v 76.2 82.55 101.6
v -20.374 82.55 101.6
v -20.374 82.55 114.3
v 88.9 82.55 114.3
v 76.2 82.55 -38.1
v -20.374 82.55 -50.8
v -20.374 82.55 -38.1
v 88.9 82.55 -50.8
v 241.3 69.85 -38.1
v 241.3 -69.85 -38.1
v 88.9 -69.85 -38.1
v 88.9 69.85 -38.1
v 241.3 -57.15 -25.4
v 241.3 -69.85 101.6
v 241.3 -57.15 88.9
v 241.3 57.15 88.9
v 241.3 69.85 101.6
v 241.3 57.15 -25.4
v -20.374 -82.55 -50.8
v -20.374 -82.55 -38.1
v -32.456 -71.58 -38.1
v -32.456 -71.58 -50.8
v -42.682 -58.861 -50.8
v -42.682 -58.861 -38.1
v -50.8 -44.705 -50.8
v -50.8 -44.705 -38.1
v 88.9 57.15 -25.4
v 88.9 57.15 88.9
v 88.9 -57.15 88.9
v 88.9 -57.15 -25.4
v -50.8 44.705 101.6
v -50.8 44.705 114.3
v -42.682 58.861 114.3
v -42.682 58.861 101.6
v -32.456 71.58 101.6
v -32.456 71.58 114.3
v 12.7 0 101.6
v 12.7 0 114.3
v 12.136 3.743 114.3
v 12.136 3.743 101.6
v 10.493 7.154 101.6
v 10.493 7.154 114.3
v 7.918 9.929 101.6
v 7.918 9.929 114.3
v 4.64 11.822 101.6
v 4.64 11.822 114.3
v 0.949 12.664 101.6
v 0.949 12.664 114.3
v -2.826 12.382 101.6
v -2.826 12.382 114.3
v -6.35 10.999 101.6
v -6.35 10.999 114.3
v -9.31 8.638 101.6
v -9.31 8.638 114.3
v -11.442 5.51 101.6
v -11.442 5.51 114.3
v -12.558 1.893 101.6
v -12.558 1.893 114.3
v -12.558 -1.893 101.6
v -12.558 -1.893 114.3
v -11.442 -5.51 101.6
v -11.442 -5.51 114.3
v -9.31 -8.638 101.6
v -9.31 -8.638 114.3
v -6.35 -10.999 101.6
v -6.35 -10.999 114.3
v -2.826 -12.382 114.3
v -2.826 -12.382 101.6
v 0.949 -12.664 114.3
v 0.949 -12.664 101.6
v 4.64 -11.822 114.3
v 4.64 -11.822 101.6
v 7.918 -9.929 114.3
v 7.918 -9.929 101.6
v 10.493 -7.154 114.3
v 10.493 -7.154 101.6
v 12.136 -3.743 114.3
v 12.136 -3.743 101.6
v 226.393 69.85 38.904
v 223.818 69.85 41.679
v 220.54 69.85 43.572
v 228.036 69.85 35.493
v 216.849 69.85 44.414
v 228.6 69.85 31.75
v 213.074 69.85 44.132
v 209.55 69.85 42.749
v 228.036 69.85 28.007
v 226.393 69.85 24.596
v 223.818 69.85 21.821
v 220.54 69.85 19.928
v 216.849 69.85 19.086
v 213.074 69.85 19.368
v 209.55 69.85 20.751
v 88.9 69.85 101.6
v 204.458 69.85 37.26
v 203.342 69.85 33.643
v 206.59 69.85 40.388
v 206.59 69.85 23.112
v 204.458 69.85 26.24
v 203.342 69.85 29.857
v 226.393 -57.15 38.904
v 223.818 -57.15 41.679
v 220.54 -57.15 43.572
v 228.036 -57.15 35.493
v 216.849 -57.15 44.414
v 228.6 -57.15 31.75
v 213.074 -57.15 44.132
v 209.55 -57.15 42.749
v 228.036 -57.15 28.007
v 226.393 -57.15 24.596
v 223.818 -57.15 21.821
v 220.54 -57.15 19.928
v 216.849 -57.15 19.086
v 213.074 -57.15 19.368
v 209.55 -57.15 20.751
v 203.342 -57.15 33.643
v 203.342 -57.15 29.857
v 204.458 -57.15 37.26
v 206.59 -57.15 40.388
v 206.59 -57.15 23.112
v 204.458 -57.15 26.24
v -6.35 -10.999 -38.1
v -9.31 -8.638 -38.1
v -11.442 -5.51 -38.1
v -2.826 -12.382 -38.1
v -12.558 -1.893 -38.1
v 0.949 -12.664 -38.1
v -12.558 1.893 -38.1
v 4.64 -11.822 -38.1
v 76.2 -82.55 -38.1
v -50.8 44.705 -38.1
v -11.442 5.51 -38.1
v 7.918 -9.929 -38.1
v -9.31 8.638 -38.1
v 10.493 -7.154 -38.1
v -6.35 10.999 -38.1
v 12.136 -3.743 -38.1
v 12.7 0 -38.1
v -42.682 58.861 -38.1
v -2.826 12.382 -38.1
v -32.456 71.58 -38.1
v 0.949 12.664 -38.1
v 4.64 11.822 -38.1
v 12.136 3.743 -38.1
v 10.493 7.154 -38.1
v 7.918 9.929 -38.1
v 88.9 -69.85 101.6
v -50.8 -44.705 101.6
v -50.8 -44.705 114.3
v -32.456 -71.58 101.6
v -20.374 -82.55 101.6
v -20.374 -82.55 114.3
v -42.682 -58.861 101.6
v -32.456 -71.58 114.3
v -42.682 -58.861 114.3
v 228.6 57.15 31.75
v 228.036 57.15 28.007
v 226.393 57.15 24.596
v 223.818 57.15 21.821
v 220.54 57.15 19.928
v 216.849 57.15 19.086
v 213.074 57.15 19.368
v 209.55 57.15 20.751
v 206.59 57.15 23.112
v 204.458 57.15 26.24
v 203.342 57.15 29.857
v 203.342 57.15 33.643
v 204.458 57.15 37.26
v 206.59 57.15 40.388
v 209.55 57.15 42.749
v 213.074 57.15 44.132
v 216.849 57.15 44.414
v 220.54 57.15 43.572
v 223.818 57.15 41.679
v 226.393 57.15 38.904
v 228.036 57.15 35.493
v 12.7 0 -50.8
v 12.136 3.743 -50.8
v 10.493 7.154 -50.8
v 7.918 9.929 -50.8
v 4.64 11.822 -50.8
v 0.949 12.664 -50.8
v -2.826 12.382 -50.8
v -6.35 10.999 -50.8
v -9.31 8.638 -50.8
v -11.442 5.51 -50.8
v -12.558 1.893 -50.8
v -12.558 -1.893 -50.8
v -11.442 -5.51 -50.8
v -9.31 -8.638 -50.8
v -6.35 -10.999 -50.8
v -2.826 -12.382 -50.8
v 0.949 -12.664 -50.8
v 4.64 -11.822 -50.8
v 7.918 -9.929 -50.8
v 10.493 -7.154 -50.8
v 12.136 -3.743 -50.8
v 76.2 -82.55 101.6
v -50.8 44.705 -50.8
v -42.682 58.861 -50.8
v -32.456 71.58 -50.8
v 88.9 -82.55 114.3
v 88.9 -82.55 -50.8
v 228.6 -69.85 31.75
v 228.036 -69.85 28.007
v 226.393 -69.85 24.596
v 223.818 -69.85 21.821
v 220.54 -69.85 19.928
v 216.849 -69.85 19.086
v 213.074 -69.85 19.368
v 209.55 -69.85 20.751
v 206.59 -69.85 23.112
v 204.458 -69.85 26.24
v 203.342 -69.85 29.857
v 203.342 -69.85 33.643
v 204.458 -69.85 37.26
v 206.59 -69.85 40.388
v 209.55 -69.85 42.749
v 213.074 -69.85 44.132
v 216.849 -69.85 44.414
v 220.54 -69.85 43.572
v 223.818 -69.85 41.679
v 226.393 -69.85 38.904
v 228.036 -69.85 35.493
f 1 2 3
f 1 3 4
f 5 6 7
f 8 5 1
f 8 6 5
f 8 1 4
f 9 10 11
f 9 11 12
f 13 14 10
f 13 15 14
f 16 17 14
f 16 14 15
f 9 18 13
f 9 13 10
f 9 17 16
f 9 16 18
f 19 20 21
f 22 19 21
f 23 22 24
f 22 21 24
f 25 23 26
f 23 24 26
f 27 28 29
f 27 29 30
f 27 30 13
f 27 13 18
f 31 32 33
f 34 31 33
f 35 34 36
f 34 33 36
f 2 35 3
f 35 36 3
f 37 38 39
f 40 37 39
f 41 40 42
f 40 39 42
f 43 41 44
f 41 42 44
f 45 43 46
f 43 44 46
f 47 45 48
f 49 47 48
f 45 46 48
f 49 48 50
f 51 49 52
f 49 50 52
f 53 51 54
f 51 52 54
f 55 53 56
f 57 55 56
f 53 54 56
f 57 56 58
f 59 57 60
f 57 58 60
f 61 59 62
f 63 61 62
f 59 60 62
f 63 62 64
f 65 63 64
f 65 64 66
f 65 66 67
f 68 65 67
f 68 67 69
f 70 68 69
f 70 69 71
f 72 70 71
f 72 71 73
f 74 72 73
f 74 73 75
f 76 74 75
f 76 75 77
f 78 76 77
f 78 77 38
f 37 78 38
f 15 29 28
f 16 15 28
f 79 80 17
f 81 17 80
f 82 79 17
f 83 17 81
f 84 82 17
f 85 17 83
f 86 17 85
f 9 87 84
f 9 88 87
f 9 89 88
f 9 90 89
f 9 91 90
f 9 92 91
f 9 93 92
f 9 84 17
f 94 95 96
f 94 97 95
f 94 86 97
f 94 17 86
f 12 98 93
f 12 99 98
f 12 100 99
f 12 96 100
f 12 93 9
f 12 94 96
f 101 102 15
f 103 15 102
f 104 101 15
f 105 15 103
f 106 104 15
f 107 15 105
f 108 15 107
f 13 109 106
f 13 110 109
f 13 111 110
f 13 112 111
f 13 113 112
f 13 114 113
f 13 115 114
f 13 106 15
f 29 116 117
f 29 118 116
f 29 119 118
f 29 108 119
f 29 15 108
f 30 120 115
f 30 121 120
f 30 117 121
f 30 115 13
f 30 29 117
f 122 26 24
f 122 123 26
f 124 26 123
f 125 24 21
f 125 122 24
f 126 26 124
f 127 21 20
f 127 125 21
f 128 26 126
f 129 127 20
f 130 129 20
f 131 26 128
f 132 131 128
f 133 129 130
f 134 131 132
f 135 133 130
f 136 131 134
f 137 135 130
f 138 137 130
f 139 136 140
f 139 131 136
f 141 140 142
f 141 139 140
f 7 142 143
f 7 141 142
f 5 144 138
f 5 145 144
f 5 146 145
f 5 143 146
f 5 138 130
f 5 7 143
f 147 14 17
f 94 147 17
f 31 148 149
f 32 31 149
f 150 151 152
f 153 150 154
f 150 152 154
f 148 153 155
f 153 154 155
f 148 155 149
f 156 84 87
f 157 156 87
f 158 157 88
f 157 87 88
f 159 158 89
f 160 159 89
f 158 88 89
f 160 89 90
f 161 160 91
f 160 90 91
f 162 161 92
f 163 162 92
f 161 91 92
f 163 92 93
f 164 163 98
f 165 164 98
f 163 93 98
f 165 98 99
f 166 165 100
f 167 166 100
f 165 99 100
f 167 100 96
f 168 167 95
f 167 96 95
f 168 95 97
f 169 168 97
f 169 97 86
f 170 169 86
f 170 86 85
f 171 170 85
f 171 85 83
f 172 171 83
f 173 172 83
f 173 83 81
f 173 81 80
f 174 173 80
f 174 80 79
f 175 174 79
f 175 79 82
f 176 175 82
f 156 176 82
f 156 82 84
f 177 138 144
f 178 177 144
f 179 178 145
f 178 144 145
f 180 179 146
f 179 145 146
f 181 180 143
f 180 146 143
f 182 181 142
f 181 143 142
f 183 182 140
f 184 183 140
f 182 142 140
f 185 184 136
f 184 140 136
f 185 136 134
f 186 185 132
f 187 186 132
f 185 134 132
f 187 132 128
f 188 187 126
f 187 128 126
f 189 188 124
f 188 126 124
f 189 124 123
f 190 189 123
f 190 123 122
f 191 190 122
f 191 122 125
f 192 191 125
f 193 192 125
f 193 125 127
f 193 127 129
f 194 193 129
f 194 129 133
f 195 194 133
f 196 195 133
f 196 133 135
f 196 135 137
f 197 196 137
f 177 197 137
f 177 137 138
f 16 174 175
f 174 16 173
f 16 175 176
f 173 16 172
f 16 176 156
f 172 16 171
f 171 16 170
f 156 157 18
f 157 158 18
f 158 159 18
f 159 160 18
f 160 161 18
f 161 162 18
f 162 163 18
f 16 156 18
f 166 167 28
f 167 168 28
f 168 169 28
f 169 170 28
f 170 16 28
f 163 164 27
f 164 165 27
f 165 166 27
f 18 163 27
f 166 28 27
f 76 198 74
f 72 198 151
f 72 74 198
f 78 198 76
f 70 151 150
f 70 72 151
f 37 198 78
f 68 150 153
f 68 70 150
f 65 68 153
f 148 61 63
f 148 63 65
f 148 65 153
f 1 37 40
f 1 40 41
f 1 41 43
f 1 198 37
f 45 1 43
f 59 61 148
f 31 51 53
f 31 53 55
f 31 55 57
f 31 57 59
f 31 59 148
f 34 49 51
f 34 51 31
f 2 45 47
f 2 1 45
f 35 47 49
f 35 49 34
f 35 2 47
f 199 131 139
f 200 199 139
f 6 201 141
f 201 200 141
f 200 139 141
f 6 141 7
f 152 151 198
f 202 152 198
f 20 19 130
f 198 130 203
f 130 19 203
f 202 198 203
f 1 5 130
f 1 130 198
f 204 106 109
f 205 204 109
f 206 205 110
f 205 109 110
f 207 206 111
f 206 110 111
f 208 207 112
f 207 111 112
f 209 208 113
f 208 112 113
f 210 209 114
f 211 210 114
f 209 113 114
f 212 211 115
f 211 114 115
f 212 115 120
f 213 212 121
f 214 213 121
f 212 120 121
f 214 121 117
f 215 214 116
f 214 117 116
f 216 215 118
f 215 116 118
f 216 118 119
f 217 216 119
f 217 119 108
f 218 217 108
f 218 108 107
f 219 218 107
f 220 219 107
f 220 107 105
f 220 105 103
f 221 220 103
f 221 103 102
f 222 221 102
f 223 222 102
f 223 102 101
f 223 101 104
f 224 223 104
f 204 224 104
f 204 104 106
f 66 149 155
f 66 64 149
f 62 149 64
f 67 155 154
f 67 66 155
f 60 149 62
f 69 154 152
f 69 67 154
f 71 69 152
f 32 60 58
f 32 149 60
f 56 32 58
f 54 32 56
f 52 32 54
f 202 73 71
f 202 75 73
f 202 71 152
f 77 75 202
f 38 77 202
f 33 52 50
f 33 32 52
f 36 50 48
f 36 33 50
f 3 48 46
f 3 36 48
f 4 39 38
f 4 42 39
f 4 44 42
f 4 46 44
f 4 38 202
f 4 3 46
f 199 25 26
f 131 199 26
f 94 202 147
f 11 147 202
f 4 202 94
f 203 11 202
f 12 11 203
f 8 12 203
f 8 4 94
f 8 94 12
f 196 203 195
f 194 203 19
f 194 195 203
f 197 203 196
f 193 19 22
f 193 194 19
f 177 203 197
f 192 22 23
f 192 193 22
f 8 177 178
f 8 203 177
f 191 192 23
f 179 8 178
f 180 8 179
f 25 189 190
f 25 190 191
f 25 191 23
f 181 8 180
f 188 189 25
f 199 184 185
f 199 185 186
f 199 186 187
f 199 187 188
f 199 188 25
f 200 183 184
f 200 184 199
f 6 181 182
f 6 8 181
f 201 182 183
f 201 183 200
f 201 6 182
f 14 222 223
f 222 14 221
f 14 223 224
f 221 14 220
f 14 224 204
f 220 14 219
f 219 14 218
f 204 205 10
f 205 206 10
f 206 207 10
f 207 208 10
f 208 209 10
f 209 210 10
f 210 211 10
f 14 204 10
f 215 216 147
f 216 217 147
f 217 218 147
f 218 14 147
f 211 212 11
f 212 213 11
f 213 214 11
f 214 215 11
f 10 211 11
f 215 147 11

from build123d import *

# Parameters (mm, degrees)
BOSS_EXTRUDE1_DEPTH     = 82.55
SKETCH4_W               = 139.7
SKETCH4_H               = 139.7
SKETCH4_W_2             = 114.3
SKETCH4_H_2             = 114.3
BOSS_EXTRUDE2_DEPTH     = 152.4
SKETCH5_R               = 12.7
CUT_EXTRUDE1_DEPTH      = 1
CUT_EXTRUDE1_DEPTH_BACK = 166.1
SKETCH6_R               = 12.7
CUT_EXTRUDE2_DEPTH      = 13.7
CUT_EXTRUDE2_DEPTH_BACK = 153.4
CUT_EXTRUDE4_DEPTH      = 1
CUT_EXTRUDE4_DEPTH_BACK = 166.1
BODY_MOVE_COPY1_ANGLE   = 90
BODY_MOVE_COPY2_ANGLE   = 90


with BuildPart() as part:
    # Sketch2 → Boss-Extrude1 (new body, symmetric)
    with BuildSketch(Plane(origin=(0, 0, 0), x_dir=(1, 0, 0), z_dir=(0, 1, 0))):
        Polygon((-50.8, 38.1), (76.2, 38.1), (76.2, -101.6), (-50.8, -101.6), (-50.8, -114.3), (88.9, -114.3), (88.9, 50.8), (-50.8, 50.8), align=None)
    extrude(amount=BOSS_EXTRUDE1_DEPTH, both=True)

    # Sketch4 → Boss-Extrude2 (add)
    with BuildSketch(Plane(origin=(88.9, 0, 0), x_dir=(0, 0, -1), z_dir=(1, 0, 0))):
        with Locations((-31.75, 0)):
            Rectangle(SKETCH4_W, SKETCH4_H)
        with Locations((-31.75, 0)):
            Rectangle(SKETCH4_W_2, SKETCH4_H_2, mode=Mode.SUBTRACT)
    extrude(amount=BOSS_EXTRUDE2_DEPTH)

    # Sketch5 → Cut-Extrude1 (cut, two sides)
    with BuildSketch(Plane.XY.offset(114.3)) as cut_extrude1_sk:
        Circle(SKETCH5_R)
    extrude(amount=CUT_EXTRUDE1_DEPTH, mode=Mode.SUBTRACT)
    extrude(cut_extrude1_sk.sketch, amount=-CUT_EXTRUDE1_DEPTH_BACK, mode=Mode.SUBTRACT)

    # Sketch6 → Cut-Extrude2 (cut, two sides)
    with BuildSketch(Plane(origin=(0, 69.85, 0), x_dir=(1, 0, 0), z_dir=(0, 1, 0))) as cut_extrude2_sk:
        with Locations((215.9, -31.75)):
            Circle(SKETCH6_R)
    extrude(amount=CUT_EXTRUDE2_DEPTH, mode=Mode.SUBTRACT)
    extrude(cut_extrude2_sk.sketch, amount=-CUT_EXTRUDE2_DEPTH_BACK, mode=Mode.SUBTRACT)

    # Sketch7 → Cut-Extrude4 (cut, two sides)
    with BuildSketch(Plane.XY.offset(114.3)) as cut_extrude4_sk:
        with BuildLine():
            Line((-20.374273833, 82.55), (-68.429055494, 82.55))
            Line((-68.429055494, 82.55), (-68.429055494, -82.55))
            Line((-68.429055494, -82.55), (-20.374273833, -82.55))
            ThreePointArc((-20.374273833, -82.55), (-60.854450977, 0), (-20.374273833, 82.55))
        make_face()
    extrude(amount=CUT_EXTRUDE4_DEPTH, mode=Mode.SUBTRACT)
    extrude(cut_extrude4_sk.sketch, amount=-CUT_EXTRUDE4_DEPTH_BACK, mode=Mode.SUBTRACT)


with BuildPart() as part_1:
    # Body-Move/Copy1: moved
    add(part.part.rotate(Axis((0, 0, 31.75025), (1, 0, 0)), BODY_MOVE_COPY1_ANGLE))


with BuildPart() as part_2:
    # Body-Move/Copy2: moved
    add(part_1.part.rotate(Axis((0, 0, 31.75025), (-1, 0, 0)), BODY_MOVE_COPY2_ANGLE))


solid = part_2.part
